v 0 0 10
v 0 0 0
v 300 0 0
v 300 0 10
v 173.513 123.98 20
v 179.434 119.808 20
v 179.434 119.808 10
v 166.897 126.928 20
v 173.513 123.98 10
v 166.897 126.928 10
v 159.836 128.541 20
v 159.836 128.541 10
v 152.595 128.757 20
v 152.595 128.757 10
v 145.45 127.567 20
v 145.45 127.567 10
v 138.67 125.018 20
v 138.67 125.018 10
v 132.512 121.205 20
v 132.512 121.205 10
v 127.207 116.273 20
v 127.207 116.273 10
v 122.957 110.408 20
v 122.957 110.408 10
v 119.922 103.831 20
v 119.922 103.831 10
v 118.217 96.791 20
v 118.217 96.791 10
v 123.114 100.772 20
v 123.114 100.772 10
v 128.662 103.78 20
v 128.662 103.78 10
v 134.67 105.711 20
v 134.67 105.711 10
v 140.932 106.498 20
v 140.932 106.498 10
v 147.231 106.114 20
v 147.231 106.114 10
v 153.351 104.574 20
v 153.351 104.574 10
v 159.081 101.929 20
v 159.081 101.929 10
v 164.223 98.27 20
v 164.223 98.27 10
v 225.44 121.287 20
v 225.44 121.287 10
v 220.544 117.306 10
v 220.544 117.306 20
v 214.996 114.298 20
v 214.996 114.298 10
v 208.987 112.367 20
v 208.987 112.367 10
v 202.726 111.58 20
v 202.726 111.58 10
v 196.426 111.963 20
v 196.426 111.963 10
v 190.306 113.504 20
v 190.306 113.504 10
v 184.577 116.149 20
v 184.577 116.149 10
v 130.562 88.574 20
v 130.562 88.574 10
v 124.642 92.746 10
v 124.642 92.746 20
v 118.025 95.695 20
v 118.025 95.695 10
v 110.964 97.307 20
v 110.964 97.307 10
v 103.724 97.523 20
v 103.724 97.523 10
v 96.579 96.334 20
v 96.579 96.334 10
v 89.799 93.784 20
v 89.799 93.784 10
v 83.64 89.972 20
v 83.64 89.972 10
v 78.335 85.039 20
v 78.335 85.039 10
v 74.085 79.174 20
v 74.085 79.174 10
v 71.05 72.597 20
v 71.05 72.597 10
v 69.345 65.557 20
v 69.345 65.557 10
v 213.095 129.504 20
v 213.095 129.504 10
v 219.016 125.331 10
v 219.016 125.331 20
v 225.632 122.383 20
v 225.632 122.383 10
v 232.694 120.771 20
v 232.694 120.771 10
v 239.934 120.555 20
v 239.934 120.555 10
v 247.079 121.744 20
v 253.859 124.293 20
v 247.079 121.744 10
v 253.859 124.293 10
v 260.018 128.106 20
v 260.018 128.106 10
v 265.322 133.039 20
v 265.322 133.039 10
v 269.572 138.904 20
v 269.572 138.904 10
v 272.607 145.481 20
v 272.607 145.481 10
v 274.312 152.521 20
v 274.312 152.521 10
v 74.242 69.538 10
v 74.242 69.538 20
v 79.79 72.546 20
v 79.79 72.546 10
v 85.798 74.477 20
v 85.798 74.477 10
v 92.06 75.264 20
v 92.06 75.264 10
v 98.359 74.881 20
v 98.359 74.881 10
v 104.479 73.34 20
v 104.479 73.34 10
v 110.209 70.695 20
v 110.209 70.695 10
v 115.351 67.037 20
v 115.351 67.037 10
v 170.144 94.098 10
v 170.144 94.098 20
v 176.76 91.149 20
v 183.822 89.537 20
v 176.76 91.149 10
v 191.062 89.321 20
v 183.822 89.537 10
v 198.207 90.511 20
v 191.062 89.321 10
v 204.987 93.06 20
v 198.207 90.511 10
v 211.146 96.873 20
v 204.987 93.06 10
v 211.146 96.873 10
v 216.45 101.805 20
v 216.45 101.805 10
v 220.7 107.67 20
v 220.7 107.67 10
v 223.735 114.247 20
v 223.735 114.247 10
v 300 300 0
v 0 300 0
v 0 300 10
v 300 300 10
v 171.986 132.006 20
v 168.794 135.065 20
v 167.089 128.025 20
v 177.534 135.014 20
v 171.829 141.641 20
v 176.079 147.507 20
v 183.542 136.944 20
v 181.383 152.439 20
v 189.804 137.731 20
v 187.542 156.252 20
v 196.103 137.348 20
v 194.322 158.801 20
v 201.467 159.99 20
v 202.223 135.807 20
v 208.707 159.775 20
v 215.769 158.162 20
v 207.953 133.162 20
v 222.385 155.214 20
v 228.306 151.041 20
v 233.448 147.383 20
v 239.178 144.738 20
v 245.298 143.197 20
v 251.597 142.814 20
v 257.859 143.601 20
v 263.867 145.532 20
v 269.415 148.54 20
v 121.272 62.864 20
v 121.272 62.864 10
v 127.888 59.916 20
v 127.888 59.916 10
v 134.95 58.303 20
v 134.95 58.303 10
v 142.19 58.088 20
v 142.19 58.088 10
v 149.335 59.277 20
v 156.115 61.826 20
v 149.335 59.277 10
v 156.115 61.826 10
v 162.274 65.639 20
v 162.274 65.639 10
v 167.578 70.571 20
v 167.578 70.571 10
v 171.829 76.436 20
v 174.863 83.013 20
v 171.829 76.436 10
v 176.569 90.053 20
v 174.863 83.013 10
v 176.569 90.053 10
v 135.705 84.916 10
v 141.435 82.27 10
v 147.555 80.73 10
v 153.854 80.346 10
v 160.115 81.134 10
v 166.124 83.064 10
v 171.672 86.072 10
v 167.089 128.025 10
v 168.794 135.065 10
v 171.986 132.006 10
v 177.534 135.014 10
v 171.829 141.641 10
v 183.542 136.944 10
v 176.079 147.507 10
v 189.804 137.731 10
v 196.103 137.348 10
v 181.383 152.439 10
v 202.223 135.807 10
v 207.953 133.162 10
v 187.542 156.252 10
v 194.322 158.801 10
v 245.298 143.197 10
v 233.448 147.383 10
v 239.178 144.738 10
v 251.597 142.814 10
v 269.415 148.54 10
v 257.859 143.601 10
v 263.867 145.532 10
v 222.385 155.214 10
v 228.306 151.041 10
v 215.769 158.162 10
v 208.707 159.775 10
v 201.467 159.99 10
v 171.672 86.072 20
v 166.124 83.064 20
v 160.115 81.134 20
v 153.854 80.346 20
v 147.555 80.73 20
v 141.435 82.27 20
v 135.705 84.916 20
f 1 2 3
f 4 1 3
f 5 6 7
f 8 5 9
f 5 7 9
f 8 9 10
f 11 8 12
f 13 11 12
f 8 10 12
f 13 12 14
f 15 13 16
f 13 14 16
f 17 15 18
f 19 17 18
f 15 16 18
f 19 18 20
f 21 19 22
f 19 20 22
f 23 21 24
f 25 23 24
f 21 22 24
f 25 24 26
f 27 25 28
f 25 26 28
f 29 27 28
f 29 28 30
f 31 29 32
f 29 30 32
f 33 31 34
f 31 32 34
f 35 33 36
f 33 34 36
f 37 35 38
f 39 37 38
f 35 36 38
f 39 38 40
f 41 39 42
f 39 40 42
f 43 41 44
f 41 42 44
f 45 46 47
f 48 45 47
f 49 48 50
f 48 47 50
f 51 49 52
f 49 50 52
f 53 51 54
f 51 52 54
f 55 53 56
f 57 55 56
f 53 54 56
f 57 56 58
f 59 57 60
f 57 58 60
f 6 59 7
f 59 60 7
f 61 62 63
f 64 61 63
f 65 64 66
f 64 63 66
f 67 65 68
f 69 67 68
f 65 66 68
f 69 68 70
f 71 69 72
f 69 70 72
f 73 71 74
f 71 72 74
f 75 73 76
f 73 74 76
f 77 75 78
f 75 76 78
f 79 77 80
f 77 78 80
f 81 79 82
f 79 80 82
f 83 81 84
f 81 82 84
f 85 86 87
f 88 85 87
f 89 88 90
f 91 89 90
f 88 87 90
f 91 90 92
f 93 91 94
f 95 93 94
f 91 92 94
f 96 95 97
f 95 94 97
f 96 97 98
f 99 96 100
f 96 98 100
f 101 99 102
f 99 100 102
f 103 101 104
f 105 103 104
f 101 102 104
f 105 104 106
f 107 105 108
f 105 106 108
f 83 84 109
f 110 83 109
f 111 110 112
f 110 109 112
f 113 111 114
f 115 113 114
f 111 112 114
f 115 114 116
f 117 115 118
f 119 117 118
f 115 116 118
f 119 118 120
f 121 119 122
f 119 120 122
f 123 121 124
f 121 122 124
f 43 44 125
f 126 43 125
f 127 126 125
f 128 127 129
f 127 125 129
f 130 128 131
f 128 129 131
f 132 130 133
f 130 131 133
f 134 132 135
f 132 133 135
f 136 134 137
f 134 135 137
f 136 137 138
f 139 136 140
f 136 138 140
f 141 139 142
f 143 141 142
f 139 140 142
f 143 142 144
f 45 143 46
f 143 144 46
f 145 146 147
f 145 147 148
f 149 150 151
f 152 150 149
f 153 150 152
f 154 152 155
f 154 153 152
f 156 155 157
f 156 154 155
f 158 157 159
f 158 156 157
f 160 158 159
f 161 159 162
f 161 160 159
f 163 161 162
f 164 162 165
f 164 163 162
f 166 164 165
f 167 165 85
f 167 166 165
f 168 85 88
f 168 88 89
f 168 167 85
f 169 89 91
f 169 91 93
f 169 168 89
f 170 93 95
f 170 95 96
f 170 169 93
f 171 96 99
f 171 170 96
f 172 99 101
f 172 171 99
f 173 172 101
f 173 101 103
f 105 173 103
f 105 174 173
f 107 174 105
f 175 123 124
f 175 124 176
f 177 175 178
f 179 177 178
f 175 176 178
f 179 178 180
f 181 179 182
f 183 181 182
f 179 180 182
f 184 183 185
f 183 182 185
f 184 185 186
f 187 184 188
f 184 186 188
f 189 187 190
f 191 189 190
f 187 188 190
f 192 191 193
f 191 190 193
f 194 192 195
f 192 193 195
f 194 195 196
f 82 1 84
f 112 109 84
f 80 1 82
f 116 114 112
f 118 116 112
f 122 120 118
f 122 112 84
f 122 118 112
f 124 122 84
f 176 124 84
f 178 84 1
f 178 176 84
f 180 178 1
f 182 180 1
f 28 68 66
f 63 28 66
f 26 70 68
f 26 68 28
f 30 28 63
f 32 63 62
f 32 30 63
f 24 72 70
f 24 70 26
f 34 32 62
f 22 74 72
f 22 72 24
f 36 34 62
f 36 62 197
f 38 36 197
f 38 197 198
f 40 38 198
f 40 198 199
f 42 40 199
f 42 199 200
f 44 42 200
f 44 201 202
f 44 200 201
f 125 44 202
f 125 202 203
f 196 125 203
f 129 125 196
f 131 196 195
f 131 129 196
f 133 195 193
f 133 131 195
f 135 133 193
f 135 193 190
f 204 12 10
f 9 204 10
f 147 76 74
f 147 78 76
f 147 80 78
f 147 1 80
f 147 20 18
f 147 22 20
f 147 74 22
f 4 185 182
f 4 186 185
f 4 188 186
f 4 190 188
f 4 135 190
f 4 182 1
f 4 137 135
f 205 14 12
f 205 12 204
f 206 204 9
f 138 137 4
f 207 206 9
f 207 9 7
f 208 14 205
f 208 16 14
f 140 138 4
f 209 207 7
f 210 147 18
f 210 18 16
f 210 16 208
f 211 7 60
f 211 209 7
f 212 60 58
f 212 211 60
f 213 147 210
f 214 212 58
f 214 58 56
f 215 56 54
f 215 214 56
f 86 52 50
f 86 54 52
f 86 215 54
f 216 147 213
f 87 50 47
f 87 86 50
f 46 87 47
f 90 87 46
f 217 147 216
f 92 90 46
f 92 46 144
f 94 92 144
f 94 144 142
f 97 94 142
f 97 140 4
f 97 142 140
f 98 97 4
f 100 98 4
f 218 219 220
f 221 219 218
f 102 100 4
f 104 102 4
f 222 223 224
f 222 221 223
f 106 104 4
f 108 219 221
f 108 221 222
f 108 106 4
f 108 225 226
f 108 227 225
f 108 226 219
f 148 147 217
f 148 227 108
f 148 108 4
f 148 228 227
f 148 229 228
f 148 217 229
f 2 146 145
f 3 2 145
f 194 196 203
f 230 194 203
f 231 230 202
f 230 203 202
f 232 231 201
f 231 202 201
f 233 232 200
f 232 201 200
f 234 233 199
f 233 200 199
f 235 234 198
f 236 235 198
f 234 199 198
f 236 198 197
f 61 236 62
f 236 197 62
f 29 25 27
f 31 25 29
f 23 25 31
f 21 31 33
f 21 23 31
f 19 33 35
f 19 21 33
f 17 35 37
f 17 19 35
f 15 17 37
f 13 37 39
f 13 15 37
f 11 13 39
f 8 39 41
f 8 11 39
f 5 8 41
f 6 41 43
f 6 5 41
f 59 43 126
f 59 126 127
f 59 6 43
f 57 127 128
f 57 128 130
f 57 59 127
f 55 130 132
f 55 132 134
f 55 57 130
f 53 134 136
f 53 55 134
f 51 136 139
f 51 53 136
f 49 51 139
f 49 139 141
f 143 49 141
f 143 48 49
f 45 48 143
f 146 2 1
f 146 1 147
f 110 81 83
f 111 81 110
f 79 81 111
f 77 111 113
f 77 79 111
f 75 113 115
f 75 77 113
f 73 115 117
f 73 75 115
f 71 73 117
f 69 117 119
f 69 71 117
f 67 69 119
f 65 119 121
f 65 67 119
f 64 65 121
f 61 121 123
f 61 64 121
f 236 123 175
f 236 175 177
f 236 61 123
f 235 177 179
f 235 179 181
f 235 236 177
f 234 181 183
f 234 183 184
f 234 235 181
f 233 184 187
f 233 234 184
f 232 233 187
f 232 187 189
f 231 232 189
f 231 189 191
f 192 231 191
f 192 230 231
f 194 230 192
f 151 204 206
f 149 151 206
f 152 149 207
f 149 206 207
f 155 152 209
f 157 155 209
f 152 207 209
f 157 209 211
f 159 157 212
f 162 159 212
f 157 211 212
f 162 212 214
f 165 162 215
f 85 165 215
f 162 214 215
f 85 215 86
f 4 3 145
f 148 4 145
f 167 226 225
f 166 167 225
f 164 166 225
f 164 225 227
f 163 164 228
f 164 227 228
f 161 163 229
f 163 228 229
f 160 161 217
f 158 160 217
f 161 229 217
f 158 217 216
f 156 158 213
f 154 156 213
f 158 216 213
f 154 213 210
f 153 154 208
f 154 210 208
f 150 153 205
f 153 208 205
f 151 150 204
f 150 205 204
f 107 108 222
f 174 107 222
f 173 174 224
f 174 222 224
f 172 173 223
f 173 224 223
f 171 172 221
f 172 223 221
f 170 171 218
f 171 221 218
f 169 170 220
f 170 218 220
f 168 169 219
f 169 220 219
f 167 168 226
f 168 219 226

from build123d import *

# Parameters (mm, degrees)
SKICA1_W                = 300
SKICA1_H                = 300
P_IDAT_VYSUNUT_M1_DEPTH = 10
P_IDAT_VYSUNUT_M3_DEPTH = 10


with BuildPart() as part:
    # Skica1 → Přidat vysunutím1 (new body)
    with BuildSketch(Plane.XY):
        with Locations((150, 150)):
            Rectangle(SKICA1_W, SKICA1_H)
    extrude(amount=P_IDAT_VYSUNUT_M1_DEPTH)

    # Skica3 → Přidat vysunutím3 (add)
    with BuildSketch(Plane.XY.offset(10)):
        with BuildLine():
            ThreePointArc((115.351436594, 67.036617417), (152.787337691, 60.386270146), (176.568555926, 90.053212507))
            ThreePointArc((176.568555926, 90.053212507), (153.853792867, 80.346404756), (130.562326016, 88.573807107))
            ThreePointArc((130.562326016, 88.573807107), (93.126424919, 95.224154378), (69.345206683, 65.557212017))
            ThreePointArc((69.345206683, 65.557212017), (92.059969742, 75.264019769), (115.351436594, 67.036617417))
        make_face()
        with BuildLine():
            ThreePointArc((179.434133768, 119.807545389), (141.998232671, 126.45789266), (118.217014435, 96.790950299))
            ThreePointArc((118.217014435, 96.790950299), (140.931777494, 106.49775805), (164.223244346, 98.270355699))
            ThreePointArc((164.223244346, 98.270355699), (201.659145443, 91.620008428), (225.440363678, 121.286950789))
            ThreePointArc((225.440363678, 121.286950789), (202.725600619, 111.580143037), (179.434133768, 119.807545389))
        make_face()
        with BuildLine():
            ThreePointArc((228.30594152, 151.04128367), (190.870040423, 157.691630941), (167.088822187, 128.024688581))
            ThreePointArc((167.088822187, 128.024688581), (189.803585246, 137.731496332), (213.095052098, 129.504093981))
            ThreePointArc((213.095052098, 129.504093981), (250.530953195, 122.85374671), (274.31217143, 152.52068907))
            ThreePointArc((274.31217143, 152.52068907), (251.597408371, 142.813881319), (228.30594152, 151.04128367))
        make_face()
    extrude(amount=P_IDAT_VYSUNUT_M3_DEPTH)


solid = part.part
